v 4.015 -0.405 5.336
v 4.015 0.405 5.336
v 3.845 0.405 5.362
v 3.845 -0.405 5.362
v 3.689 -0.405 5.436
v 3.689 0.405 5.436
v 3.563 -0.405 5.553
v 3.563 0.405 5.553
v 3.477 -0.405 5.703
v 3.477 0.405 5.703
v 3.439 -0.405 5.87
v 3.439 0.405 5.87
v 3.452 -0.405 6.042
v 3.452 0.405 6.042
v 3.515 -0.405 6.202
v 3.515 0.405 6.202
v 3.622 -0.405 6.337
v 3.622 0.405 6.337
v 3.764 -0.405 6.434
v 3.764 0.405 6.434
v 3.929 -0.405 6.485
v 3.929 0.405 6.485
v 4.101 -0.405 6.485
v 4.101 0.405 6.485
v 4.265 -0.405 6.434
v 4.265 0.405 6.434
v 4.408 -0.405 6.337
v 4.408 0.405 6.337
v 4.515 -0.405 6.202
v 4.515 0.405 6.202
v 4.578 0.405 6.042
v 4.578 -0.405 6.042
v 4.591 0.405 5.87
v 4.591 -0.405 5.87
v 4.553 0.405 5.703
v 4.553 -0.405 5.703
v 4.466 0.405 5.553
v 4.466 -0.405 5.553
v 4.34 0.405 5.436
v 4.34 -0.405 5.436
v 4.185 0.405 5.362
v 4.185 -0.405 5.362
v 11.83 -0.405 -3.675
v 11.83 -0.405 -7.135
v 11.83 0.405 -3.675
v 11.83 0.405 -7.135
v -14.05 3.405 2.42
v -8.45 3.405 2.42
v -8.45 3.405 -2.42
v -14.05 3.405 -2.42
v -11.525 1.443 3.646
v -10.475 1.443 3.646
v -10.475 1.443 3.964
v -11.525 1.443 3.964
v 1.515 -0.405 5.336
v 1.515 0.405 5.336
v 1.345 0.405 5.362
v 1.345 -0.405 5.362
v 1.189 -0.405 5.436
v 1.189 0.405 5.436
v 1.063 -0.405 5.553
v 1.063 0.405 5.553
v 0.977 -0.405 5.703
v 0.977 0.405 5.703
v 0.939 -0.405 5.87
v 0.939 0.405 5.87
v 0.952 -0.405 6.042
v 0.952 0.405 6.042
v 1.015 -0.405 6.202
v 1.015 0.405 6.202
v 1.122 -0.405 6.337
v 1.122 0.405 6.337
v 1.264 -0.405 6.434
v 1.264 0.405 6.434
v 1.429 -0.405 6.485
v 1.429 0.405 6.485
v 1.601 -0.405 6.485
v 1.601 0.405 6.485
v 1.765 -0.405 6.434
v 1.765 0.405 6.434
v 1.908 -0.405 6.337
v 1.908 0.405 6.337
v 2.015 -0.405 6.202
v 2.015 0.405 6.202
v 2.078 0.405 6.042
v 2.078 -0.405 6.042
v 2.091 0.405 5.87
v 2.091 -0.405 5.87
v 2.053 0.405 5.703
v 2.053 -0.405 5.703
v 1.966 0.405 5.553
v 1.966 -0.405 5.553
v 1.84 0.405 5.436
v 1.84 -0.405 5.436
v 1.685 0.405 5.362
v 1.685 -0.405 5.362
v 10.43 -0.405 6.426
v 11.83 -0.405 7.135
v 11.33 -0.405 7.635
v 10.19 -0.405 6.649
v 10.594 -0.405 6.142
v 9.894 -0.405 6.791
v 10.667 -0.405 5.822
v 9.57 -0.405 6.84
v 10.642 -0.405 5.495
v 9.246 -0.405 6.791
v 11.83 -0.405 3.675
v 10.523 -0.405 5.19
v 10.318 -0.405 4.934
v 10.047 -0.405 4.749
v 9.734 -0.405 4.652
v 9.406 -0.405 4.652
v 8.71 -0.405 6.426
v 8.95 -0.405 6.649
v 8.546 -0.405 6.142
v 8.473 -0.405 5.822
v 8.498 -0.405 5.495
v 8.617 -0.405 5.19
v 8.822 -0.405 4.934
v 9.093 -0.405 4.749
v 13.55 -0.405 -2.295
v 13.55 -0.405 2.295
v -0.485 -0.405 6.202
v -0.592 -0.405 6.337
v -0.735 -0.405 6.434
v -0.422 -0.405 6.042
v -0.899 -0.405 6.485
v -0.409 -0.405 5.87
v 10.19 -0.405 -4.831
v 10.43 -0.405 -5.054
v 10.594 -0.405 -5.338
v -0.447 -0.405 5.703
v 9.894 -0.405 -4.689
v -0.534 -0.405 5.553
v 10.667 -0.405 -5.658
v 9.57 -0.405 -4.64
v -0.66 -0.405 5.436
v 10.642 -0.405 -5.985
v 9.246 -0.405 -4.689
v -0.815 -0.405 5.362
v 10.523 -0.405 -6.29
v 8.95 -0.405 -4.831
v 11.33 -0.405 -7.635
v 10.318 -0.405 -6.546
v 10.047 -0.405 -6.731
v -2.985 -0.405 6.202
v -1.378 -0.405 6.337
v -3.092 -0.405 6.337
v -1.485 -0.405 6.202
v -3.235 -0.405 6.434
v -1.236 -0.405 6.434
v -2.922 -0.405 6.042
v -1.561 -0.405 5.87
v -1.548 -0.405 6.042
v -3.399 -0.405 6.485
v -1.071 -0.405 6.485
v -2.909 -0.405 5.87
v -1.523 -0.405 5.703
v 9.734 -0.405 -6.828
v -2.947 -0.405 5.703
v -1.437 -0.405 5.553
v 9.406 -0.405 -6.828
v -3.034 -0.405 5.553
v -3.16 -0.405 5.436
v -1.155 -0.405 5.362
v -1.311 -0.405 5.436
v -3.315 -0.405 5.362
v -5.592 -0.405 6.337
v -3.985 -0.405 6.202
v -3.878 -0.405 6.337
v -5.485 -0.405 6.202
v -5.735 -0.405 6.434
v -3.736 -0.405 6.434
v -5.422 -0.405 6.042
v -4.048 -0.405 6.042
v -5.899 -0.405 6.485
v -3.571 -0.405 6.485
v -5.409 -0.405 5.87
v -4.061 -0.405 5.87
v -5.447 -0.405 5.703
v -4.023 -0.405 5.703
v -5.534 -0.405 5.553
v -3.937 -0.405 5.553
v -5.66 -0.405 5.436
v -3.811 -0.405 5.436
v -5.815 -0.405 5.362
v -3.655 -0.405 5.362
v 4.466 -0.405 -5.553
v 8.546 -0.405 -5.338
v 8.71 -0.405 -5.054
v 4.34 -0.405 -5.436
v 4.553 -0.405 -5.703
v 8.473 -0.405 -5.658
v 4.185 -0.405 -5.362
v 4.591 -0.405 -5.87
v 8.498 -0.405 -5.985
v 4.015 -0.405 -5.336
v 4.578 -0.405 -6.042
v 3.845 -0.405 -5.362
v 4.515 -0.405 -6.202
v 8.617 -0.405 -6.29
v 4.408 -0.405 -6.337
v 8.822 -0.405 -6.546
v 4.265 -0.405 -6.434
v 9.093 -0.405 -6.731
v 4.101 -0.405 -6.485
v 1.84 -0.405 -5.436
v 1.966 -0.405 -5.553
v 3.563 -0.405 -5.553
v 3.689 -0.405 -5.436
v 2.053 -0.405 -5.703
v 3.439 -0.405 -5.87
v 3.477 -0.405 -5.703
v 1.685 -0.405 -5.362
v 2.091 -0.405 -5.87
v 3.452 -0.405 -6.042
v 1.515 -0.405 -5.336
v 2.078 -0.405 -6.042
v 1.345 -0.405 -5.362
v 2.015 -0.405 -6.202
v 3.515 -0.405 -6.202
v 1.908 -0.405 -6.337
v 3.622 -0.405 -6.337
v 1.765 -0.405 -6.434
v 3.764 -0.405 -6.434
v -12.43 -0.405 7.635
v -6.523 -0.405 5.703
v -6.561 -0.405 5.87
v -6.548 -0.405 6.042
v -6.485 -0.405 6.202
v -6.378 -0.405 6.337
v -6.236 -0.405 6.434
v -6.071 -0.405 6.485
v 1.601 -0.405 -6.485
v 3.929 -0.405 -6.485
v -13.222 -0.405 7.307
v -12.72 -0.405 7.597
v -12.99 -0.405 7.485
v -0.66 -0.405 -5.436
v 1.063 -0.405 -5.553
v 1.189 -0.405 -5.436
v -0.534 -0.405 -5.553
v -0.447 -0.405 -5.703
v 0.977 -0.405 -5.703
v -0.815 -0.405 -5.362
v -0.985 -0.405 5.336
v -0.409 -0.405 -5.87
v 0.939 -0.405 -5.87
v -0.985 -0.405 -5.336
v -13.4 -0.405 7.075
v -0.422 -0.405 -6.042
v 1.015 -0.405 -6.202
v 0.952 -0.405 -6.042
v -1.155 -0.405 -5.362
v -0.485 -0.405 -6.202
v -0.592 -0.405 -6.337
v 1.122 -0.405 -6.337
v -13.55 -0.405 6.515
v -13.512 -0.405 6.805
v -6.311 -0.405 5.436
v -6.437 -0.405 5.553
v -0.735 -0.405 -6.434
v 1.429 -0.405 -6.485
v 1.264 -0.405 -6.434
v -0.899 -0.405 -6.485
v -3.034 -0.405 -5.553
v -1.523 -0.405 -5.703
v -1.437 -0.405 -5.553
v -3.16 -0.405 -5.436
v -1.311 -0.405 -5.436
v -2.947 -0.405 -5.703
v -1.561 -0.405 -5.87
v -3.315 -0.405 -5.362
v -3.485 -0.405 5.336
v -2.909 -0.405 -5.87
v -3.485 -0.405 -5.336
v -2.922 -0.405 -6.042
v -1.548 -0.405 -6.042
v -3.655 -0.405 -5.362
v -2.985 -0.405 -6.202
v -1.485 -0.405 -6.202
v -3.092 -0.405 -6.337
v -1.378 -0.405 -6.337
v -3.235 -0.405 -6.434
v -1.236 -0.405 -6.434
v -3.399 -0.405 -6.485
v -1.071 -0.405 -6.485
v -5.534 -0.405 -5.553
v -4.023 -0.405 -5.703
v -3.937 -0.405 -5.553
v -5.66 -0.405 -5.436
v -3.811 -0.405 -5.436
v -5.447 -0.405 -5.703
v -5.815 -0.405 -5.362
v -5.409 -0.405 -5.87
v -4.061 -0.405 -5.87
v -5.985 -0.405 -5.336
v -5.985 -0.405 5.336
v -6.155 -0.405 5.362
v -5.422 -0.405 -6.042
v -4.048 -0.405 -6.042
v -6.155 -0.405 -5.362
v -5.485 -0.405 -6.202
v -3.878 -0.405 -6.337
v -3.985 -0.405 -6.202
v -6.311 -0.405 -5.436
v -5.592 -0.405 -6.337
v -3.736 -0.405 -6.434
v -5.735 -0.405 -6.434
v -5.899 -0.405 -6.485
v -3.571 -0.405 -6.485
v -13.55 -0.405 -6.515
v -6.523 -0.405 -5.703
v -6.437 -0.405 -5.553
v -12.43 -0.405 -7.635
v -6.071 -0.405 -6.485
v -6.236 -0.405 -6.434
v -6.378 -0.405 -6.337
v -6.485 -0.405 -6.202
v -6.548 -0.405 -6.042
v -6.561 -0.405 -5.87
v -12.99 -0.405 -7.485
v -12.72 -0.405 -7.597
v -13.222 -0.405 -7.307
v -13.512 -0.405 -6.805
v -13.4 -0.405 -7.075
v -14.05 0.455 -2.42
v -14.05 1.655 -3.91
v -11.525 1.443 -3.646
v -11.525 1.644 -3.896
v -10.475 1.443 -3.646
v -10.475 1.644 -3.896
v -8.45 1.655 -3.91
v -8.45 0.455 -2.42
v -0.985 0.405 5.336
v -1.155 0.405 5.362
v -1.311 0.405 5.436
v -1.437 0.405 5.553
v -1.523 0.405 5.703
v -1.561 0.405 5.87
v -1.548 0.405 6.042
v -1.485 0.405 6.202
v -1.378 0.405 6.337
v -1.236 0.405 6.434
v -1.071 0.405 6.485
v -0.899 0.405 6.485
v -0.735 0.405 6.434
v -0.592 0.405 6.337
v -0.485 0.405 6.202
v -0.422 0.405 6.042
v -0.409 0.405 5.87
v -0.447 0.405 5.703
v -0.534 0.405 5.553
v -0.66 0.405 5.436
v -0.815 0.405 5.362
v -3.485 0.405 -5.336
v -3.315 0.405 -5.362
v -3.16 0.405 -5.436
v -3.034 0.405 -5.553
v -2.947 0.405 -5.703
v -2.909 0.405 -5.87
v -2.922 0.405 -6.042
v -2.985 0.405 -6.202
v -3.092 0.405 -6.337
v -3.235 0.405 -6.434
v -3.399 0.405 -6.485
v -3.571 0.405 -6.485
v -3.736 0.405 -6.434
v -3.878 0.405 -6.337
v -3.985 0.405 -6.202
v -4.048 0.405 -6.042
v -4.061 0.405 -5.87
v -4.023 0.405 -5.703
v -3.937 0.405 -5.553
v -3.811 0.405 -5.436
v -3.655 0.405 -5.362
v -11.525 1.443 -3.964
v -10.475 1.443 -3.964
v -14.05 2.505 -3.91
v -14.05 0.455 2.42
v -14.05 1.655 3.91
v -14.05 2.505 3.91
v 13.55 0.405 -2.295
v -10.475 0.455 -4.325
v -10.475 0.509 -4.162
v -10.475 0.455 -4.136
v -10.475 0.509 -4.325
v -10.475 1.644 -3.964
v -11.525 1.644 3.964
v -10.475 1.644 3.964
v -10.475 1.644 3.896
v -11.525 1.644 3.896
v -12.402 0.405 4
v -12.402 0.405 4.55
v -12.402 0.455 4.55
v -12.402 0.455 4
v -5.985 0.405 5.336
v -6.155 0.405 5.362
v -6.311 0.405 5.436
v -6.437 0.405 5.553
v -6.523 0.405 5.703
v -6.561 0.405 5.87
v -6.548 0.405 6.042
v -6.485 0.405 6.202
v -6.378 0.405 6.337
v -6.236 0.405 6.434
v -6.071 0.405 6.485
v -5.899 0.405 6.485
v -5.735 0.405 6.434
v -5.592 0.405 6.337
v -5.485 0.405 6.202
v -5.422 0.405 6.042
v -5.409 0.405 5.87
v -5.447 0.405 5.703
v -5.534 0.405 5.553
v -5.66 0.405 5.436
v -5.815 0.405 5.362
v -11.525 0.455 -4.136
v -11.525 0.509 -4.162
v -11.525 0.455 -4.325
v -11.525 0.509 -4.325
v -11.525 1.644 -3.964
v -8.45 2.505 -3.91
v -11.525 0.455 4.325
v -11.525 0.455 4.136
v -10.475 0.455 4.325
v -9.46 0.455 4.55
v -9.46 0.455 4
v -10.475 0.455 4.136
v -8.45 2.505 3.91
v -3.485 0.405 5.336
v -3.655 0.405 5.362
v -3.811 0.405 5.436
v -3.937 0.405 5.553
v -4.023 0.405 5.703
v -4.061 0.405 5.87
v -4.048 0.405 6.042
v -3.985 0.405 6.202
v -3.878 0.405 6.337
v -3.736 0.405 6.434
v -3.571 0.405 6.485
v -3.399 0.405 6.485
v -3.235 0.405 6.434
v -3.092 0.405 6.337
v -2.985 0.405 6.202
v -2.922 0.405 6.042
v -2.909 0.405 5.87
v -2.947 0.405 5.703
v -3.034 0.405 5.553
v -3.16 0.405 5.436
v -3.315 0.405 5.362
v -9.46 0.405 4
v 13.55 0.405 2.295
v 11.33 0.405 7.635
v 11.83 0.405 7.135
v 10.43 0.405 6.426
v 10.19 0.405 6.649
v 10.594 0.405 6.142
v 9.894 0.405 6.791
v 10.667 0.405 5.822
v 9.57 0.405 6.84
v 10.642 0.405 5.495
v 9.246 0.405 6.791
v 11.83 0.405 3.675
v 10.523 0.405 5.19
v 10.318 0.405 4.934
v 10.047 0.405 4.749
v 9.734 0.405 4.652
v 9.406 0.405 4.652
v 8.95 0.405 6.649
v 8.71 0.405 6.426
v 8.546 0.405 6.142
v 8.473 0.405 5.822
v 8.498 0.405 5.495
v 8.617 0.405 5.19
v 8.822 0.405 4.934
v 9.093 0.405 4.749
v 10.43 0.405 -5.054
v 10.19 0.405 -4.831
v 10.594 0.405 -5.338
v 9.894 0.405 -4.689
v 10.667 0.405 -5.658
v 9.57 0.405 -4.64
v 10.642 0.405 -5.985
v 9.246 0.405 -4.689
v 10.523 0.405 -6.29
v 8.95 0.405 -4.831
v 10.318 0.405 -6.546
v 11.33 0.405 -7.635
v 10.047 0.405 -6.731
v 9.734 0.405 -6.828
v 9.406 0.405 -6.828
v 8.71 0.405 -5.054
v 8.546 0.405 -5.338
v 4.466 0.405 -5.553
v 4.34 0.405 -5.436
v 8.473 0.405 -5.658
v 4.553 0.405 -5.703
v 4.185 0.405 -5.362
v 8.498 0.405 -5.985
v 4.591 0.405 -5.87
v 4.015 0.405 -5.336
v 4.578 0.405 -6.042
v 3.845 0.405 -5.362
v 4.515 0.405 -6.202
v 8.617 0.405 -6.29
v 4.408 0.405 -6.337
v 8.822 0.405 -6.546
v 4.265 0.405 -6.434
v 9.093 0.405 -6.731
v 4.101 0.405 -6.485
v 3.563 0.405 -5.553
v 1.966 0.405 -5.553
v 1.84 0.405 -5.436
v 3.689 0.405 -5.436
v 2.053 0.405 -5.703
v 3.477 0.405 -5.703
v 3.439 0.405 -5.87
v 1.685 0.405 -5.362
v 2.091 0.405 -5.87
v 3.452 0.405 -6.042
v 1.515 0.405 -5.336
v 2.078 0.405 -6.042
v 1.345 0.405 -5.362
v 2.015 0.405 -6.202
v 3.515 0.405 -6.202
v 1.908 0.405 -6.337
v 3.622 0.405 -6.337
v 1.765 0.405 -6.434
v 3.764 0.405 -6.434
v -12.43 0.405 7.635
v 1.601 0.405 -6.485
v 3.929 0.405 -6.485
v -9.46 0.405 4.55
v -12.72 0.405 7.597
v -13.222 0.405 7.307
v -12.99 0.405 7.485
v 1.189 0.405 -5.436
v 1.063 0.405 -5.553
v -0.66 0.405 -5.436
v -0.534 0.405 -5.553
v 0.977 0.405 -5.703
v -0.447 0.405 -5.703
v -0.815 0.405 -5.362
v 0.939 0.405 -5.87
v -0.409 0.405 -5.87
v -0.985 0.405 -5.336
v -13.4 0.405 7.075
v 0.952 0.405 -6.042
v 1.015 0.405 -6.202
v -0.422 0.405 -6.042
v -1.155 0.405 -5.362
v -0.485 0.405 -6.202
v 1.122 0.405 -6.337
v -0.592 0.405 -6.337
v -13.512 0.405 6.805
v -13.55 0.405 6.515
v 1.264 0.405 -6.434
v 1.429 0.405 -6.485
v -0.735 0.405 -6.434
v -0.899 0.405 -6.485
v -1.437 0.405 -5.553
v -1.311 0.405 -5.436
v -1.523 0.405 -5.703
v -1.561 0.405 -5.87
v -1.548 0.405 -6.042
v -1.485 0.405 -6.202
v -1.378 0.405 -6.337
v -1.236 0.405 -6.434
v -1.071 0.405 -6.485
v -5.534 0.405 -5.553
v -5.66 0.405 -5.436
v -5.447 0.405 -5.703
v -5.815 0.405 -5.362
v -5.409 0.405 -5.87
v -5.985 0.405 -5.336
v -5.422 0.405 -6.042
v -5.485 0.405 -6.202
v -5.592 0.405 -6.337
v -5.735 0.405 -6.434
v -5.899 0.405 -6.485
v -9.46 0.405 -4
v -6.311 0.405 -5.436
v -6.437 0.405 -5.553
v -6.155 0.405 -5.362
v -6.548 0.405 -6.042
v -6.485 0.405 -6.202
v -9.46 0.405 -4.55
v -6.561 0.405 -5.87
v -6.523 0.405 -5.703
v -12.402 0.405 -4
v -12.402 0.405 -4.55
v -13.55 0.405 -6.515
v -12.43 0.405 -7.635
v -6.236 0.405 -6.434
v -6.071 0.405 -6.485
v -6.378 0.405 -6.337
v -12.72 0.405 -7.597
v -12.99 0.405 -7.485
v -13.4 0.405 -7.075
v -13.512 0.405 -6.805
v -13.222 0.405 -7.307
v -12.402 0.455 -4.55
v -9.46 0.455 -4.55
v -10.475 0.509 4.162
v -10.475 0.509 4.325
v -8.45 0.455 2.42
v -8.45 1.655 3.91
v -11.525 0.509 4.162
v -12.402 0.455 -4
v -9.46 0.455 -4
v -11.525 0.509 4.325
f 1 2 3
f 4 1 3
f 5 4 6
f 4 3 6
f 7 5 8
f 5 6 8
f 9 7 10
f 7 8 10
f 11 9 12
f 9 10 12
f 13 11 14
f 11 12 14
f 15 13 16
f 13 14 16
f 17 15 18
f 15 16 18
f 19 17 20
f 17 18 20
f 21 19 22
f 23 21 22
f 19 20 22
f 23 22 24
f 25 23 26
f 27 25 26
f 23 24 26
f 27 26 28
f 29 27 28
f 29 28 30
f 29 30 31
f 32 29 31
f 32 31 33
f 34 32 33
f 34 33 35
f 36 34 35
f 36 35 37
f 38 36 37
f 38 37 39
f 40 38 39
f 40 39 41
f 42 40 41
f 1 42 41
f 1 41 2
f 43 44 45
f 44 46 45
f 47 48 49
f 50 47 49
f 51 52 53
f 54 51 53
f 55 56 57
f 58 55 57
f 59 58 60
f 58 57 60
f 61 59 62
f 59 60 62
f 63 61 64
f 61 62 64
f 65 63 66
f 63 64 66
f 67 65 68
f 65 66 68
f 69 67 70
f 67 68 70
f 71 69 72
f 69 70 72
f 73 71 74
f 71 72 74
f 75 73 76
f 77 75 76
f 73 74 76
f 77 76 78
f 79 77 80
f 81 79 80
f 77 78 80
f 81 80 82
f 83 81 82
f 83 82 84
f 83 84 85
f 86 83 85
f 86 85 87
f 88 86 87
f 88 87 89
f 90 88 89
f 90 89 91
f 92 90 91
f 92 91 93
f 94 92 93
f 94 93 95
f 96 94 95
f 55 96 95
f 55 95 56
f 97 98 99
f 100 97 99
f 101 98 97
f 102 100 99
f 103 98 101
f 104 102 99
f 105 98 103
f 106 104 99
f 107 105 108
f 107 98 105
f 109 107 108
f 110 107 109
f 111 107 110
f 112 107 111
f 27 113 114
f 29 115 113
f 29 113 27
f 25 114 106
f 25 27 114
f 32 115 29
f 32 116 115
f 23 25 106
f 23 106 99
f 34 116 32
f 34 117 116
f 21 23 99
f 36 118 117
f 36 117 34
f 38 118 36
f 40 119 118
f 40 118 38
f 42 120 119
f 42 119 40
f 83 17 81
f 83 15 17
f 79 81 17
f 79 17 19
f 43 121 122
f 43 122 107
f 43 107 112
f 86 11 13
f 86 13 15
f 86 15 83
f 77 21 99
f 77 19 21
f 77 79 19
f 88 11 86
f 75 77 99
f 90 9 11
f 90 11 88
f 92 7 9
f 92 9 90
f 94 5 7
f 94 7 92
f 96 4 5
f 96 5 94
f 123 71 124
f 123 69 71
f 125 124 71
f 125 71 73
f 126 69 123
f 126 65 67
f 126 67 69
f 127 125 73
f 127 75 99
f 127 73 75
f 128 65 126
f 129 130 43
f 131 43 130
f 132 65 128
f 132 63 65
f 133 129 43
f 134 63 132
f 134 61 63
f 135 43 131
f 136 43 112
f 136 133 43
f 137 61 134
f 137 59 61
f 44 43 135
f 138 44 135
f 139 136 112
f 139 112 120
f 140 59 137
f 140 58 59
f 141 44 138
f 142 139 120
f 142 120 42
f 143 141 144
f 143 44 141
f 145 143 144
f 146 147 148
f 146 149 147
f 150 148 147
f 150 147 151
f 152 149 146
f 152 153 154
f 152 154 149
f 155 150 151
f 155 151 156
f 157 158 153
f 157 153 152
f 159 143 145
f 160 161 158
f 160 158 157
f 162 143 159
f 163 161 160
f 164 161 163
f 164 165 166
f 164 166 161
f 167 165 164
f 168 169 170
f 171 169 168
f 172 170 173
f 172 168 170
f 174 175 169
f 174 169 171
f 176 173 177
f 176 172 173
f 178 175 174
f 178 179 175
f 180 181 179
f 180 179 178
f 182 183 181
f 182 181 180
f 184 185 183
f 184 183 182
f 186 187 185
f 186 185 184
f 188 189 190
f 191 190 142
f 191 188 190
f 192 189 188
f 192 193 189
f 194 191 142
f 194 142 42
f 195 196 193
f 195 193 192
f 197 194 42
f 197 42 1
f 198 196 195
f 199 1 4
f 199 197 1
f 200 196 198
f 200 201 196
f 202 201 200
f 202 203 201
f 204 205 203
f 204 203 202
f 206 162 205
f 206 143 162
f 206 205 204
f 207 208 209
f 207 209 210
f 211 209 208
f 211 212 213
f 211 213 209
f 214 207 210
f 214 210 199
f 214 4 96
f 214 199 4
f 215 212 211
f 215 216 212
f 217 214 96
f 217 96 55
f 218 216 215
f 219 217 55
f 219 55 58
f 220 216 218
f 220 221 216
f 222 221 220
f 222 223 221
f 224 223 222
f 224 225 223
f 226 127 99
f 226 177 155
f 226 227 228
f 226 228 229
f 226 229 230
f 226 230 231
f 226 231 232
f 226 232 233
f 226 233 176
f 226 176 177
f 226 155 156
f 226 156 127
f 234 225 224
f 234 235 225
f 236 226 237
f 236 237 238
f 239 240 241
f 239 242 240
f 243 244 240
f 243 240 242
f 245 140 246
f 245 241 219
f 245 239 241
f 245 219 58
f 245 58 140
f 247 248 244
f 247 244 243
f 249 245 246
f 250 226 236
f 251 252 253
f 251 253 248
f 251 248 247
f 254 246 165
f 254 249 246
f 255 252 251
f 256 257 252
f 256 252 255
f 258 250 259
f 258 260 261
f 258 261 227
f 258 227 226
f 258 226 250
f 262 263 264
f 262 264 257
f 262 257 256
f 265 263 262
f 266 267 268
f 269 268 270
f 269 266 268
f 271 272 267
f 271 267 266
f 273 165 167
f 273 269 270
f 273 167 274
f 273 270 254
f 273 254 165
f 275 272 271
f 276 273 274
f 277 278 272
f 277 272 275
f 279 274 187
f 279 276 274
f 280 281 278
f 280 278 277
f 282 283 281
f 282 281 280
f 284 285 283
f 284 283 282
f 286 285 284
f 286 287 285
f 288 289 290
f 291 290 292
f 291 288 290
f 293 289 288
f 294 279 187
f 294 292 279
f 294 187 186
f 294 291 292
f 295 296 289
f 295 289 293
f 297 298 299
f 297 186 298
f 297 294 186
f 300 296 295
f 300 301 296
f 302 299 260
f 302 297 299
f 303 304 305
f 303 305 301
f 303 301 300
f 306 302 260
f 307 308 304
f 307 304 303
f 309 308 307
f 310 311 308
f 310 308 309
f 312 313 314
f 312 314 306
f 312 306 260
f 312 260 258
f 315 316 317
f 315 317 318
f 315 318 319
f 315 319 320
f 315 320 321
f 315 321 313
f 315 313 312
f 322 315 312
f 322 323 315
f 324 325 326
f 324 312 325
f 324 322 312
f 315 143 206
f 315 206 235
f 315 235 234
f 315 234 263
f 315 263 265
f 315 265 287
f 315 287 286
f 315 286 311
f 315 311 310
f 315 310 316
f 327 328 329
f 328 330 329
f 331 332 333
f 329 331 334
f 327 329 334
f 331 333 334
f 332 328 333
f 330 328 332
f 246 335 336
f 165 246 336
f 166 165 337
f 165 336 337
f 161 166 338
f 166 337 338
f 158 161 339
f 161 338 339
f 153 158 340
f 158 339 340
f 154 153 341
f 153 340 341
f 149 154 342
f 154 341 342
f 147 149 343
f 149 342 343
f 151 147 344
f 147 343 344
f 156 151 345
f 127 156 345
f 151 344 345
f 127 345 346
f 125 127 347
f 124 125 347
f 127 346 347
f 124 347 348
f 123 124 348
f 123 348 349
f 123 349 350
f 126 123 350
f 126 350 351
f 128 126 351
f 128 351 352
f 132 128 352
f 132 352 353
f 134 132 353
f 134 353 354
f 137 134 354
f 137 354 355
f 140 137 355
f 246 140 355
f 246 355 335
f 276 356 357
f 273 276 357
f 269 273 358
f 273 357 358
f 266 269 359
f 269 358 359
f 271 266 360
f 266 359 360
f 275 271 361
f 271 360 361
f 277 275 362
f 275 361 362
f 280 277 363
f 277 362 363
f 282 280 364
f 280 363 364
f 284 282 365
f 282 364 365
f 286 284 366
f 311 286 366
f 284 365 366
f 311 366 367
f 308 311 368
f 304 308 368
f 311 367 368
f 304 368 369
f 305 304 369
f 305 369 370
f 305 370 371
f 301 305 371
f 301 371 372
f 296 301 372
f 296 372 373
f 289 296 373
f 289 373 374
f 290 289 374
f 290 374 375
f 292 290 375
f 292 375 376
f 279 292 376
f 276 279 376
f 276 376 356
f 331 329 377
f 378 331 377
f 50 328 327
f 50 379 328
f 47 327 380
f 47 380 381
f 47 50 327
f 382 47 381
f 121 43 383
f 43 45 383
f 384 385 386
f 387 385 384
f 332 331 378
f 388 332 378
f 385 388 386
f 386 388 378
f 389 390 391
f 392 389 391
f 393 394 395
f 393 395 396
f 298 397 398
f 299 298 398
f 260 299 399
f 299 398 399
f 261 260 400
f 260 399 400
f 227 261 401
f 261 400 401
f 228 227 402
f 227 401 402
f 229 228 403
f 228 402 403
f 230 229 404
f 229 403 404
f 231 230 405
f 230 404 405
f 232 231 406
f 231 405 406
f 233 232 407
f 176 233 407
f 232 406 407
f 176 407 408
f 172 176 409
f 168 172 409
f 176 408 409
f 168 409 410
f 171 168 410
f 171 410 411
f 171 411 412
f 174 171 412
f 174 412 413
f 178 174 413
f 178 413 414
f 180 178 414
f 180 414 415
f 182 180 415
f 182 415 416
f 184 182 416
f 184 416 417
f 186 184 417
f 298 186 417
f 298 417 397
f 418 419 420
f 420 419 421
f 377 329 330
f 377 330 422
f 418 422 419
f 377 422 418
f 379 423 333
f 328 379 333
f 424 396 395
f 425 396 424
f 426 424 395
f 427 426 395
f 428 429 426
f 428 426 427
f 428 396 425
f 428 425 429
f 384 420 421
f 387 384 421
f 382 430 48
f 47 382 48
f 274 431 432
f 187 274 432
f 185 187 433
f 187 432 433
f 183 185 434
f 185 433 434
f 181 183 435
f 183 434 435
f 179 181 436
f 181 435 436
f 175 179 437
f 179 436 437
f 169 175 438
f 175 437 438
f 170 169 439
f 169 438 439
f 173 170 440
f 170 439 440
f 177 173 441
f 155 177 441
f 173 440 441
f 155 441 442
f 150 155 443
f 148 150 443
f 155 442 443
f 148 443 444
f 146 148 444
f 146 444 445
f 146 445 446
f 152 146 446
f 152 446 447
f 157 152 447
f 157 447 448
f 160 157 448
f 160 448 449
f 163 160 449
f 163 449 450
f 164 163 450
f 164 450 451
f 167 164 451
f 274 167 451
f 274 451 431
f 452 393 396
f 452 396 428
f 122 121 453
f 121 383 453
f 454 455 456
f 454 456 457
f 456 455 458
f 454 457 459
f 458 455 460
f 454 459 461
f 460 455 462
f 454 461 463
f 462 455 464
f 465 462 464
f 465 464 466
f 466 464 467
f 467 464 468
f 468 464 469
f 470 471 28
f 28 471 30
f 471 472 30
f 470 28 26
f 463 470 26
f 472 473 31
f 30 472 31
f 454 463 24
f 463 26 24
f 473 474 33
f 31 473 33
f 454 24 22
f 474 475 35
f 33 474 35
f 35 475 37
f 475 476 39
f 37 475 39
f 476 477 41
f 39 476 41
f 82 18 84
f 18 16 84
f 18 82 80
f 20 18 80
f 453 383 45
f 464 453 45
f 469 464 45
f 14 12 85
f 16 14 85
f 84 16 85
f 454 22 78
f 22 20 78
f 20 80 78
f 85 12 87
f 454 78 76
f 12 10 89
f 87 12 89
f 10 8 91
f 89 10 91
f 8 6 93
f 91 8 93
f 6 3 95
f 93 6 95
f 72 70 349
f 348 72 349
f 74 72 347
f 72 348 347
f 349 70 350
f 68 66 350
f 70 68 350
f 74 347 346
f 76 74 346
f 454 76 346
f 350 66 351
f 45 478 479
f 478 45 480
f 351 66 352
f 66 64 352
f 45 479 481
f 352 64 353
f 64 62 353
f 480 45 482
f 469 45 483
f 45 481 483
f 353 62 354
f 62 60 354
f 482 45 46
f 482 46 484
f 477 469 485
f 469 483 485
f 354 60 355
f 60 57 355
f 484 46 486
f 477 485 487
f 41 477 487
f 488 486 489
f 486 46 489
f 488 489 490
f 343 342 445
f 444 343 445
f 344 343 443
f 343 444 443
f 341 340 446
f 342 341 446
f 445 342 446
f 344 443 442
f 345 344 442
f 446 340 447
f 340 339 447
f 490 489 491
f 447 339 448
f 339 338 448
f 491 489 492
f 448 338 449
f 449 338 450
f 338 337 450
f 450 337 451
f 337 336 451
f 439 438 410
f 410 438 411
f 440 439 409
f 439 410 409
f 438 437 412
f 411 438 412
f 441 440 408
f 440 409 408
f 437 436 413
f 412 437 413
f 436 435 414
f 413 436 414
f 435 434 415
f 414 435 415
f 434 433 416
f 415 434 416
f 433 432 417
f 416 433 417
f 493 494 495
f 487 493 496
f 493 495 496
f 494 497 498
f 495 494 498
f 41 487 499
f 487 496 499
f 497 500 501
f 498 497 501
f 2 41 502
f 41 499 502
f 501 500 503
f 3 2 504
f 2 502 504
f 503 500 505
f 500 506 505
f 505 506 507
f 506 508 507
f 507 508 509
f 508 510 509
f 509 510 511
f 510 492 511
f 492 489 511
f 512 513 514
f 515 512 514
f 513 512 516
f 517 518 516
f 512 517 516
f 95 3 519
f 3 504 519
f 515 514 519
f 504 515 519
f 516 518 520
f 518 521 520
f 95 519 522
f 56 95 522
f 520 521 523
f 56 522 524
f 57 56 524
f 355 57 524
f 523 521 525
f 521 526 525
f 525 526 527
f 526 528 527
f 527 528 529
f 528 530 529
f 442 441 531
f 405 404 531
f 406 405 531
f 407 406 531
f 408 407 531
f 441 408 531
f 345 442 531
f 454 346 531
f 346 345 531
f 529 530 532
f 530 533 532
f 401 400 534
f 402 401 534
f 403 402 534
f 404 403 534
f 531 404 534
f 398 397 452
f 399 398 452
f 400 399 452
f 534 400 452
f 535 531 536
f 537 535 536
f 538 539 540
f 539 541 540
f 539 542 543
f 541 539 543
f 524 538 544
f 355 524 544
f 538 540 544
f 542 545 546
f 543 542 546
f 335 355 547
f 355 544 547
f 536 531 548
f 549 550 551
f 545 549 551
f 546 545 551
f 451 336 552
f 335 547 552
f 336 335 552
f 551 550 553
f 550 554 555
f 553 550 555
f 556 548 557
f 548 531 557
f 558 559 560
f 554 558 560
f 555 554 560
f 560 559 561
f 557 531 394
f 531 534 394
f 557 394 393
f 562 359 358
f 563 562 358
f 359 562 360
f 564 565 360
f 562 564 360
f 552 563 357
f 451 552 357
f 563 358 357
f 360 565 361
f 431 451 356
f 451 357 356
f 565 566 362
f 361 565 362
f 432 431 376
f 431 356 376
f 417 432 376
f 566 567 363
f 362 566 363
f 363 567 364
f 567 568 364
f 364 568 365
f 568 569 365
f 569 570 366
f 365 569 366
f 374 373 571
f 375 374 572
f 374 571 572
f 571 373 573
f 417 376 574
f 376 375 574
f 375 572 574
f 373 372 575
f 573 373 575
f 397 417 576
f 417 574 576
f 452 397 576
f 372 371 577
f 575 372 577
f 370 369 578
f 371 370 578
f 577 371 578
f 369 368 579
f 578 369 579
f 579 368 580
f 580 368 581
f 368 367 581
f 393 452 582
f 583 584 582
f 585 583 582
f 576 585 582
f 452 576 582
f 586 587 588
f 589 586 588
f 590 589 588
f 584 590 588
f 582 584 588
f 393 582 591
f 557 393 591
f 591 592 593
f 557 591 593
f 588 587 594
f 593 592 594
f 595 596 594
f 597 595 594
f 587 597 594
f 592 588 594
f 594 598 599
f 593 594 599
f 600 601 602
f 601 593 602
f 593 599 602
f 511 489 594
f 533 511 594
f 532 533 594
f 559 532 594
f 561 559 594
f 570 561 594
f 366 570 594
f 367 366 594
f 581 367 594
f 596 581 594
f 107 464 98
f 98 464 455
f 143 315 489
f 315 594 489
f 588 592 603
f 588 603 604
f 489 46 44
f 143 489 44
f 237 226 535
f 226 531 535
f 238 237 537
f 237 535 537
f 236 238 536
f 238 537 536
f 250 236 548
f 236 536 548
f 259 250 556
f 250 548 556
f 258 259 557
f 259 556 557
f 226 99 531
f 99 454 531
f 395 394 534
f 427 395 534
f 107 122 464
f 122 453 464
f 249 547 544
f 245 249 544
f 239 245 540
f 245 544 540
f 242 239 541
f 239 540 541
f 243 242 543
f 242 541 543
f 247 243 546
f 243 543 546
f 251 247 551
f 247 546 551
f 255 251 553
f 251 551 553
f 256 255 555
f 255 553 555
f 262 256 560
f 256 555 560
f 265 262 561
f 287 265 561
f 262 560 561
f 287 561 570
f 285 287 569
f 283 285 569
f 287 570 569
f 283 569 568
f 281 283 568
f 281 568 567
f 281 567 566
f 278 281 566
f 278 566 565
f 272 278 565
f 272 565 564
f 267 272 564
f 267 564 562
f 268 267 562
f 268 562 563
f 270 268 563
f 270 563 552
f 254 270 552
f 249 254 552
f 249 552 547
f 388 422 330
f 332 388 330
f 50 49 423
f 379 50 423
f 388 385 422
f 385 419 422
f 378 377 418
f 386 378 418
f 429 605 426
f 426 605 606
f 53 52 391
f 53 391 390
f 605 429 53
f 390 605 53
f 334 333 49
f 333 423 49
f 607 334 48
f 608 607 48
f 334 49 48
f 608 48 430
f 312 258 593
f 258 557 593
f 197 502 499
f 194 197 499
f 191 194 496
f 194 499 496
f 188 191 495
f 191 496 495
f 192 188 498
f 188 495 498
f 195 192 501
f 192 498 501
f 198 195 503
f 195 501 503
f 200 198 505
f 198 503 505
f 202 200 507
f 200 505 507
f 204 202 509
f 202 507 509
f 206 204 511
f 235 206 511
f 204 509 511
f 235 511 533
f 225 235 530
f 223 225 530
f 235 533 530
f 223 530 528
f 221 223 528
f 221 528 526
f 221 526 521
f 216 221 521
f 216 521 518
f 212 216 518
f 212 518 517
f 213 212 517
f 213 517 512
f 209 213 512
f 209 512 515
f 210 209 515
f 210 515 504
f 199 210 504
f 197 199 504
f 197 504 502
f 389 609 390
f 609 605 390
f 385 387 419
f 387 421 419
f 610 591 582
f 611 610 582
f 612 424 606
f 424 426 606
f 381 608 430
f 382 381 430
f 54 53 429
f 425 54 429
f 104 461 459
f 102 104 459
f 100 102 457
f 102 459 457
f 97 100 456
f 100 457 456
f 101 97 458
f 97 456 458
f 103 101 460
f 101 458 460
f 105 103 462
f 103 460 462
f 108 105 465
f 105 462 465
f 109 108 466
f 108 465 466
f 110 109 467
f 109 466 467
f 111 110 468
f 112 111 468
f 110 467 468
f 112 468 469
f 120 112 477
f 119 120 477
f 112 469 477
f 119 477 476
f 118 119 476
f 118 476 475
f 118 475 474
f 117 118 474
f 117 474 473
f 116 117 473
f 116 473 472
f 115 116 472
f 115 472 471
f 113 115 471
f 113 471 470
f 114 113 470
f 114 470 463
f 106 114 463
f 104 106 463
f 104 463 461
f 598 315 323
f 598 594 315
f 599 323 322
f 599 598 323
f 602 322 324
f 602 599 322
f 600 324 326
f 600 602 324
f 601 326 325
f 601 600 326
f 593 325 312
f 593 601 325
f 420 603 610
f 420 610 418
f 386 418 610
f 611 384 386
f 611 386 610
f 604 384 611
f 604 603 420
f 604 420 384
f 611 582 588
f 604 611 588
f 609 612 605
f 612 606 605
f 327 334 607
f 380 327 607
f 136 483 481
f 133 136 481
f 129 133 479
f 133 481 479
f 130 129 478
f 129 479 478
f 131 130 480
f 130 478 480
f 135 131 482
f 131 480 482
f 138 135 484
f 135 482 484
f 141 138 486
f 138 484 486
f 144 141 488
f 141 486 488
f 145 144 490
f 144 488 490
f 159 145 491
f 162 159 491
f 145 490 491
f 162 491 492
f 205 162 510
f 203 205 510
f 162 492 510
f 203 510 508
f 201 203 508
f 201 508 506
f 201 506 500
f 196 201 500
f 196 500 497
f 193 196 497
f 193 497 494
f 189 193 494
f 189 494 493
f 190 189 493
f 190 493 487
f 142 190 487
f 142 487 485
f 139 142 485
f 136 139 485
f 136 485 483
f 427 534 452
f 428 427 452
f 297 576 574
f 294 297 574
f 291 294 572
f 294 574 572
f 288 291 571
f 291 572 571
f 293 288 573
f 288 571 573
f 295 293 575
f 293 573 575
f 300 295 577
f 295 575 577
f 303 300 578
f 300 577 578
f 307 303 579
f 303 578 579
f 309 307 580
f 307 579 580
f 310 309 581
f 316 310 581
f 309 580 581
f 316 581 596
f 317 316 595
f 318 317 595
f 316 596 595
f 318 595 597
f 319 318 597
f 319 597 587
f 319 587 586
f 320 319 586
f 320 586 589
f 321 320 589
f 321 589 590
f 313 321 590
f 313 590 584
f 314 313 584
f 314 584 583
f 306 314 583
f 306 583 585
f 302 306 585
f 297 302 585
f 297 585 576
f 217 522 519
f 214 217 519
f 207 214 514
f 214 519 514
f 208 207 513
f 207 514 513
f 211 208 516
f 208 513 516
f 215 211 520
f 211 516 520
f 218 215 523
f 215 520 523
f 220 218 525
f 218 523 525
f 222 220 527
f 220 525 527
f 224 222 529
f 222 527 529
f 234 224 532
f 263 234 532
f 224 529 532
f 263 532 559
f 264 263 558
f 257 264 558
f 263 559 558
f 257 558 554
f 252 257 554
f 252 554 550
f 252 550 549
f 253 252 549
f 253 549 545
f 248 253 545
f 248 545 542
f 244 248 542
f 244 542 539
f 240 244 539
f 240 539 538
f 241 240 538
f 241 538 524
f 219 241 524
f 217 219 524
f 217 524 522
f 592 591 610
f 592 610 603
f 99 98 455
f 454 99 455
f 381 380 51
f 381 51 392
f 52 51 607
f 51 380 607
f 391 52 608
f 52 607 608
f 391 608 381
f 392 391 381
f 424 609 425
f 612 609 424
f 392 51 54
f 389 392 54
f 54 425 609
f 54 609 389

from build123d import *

# Parameters (mm, degrees)
BOSS_EXTRUDE1_DEPTH      = 0.405
FILLET1_R                = 1.12
CHAMFER1_SIZE            = 0.5
SKETCH2_R                = 1.1
CUT_EXTRUDE1_DEPTH       = 16.574075414
BOSS_EXTRUDE2_DEPTH      = 0.5
BOSS_EXTRUDE2_DEPTH_BACK = 5.1
SKETCH4_W                = 2.941717286
SKETCH4_H                = 0.549853698
BOSS_EXTRUDE3_DEPTH      = 0.05
BOSS_EXTRUDE4_DEPTH      = 0.525
SKETCH6_R                = 0.577649515
CUT_EXTRUDE2_DEPTH       = 17.26947218


with BuildPart() as part:
    # Sketch1 → Boss-Extrude1 (new, symmetric)
    with BuildSketch(Plane(origin=(0, 0, 0), x_dir=(1, 0, 0), z_dir=(0, 1, 0))):
        Polygon((-13.55, 7.635), (11.83, 7.635), (11.83, 3.675), (13.55, 2.295), (13.55, -2.295), (11.83, -3.675), (11.83, -7.635), (-13.55, -7.635), align=None)
    extrude(amount=BOSS_EXTRUDE1_DEPTH, both=True)

    # Fillet1
    fillet1_edges = [part.edges().sort_by_distance(p)[0] for p in [
        (-13.55, 0, -7.635),
        (-13.55, 0, 7.635),
    ]]
    fillet(fillet1_edges, radius=FILLET1_R)

    # Chamfer1
    chamfer1_edges = [part.edges().sort_by_distance(p)[0] for p in [
        (11.83, 0, -7.635),
        (11.83, 0, 7.635),
    ]]
    chamfer(chamfer1_edges, length=CHAMFER1_SIZE)

    # Sketch2 → Cut-Extrude1 (cut, through all)
    with BuildSketch(Plane(origin=(0, 0.405, 0), x_dir=(1, 0, 0), z_dir=(0, 1, 0))):
        with Locations(Location((9.57, 5.74, 0), (0, 0, 270))):
            Circle(SKETCH2_R)
        with Locations(Location((9.57, -5.74, 0), (0, 0, 270))):
            Circle(SKETCH2_R)
    extrude(amount=-CUT_EXTRUDE1_DEPTH, mode=Mode.SUBTRACT)

    # Sketch4 → Boss-Extrude3 (add)
    with BuildSketch(Plane(origin=(0, 0.405, 0), x_dir=(1, 0, 0), z_dir=(0, 1, 0))):
        with Locations((-10.930908088, 4.275112504)):
            Rectangle(SKETCH4_W, SKETCH4_H)
        with Locations((-10.930908088, -4.275112504)):
            Rectangle(SKETCH4_W, SKETCH4_H)
    extrude(amount=BOSS_EXTRUDE3_DEPTH)



with BuildPart() as body_2:
    # Sketch3 → Boss-Extrude2 (new, two sides: drawn at the far end of the back side and taken through both)
    with BuildSketch(Plane.ZY.offset(13.55).offset(-BOSS_EXTRUDE2_DEPTH_BACK)):
        Polygon((-3.91, 1.655), (-2.42, 0.455), (2.42, 0.455), (3.91, 1.655), (3.91, 2.505), (2.42, 3.405), (-2.42, 3.405), (-3.91, 2.505), align=None)
    extrude(amount=BOSS_EXTRUDE2_DEPTH + BOSS_EXTRUDE2_DEPTH_BACK)


with BuildPart() as part_1:
    add(part.part)

    add(body_2.part)  # Boss-Extrude4 merges body 2
    # Sketch5 → Boss-Extrude4 (add, symmetric)
    with BuildSketch(Plane(origin=(-11, 0, 0), x_dir=(0, 0, -1), z_dir=(1, 0, 0))):
        Polygon((4.325381098, 0.455), (4.325381098, 0.509426612), (4.162105788, 0.509426612), (3.964358919, 1.644096311), (3.498388432, 1.644096311), (3.498388432, 1.44259556), (3.964358919, 1.44259556), (4.136474144, 0.455), align=None)
        Polygon((-4.136474144, 0.455), (-4.325381098, 0.455), (-4.325381098, 0.509426612), (-4.162105788, 0.509426612), (-3.964358919, 1.644096311), (-3.498388432, 1.644096311), (-3.498388432, 1.44259556), (-3.964358919, 1.44259556), align=None)
    extrude(amount=BOSS_EXTRUDE4_DEPTH, both=True)

    # Sketch6 → Cut-Extrude2 (cut, through all)
    with BuildSketch(Plane(origin=(0, 0.405, 0), x_dir=(1, 0, 0), z_dir=(0, 1, 0))):
        with Locations(Location((-5.985172419, 5.913658107, 0), (0, 0, 270))):
            Circle(SKETCH6_R)
        with Locations(Location((-3.485172419, 5.913658107, 0), (0, 0, 270))):
            Circle(SKETCH6_R)
        with Locations(Location((-0.985172419, 5.913658107, 0), (0, 0, 270))):
            Circle(SKETCH6_R)
        with Locations(Location((1.514827581, 5.913658107, 0), (0, 0, 270))):
            Circle(SKETCH6_R)
        with Locations(Location((4.014827581, 5.913658107, 0), (0, 0, 270))):
            Circle(SKETCH6_R)
        with Locations(Location((4.014827581, -5.913658107, 0), (0, 0, 90))):
            Circle(SKETCH6_R)
        with Locations(Location((1.514827581, -5.913658107, 0), (0, 0, 90))):
            Circle(SKETCH6_R)
        with Locations(Location((-0.985172419, -5.913658107, 0), (0, 0, 90))):
            Circle(SKETCH6_R)
        with Locations(Location((-3.485172419, -5.913658107, 0), (0, 0, 90))):
            Circle(SKETCH6_R)
        with Locations(Location((-5.985172419, -5.913658107, 0), (0, 0, 90))):
            Circle(SKETCH6_R)
    extrude(amount=-CUT_EXTRUDE2_DEPTH, mode=Mode.SUBTRACT)


solid = part_1.part
